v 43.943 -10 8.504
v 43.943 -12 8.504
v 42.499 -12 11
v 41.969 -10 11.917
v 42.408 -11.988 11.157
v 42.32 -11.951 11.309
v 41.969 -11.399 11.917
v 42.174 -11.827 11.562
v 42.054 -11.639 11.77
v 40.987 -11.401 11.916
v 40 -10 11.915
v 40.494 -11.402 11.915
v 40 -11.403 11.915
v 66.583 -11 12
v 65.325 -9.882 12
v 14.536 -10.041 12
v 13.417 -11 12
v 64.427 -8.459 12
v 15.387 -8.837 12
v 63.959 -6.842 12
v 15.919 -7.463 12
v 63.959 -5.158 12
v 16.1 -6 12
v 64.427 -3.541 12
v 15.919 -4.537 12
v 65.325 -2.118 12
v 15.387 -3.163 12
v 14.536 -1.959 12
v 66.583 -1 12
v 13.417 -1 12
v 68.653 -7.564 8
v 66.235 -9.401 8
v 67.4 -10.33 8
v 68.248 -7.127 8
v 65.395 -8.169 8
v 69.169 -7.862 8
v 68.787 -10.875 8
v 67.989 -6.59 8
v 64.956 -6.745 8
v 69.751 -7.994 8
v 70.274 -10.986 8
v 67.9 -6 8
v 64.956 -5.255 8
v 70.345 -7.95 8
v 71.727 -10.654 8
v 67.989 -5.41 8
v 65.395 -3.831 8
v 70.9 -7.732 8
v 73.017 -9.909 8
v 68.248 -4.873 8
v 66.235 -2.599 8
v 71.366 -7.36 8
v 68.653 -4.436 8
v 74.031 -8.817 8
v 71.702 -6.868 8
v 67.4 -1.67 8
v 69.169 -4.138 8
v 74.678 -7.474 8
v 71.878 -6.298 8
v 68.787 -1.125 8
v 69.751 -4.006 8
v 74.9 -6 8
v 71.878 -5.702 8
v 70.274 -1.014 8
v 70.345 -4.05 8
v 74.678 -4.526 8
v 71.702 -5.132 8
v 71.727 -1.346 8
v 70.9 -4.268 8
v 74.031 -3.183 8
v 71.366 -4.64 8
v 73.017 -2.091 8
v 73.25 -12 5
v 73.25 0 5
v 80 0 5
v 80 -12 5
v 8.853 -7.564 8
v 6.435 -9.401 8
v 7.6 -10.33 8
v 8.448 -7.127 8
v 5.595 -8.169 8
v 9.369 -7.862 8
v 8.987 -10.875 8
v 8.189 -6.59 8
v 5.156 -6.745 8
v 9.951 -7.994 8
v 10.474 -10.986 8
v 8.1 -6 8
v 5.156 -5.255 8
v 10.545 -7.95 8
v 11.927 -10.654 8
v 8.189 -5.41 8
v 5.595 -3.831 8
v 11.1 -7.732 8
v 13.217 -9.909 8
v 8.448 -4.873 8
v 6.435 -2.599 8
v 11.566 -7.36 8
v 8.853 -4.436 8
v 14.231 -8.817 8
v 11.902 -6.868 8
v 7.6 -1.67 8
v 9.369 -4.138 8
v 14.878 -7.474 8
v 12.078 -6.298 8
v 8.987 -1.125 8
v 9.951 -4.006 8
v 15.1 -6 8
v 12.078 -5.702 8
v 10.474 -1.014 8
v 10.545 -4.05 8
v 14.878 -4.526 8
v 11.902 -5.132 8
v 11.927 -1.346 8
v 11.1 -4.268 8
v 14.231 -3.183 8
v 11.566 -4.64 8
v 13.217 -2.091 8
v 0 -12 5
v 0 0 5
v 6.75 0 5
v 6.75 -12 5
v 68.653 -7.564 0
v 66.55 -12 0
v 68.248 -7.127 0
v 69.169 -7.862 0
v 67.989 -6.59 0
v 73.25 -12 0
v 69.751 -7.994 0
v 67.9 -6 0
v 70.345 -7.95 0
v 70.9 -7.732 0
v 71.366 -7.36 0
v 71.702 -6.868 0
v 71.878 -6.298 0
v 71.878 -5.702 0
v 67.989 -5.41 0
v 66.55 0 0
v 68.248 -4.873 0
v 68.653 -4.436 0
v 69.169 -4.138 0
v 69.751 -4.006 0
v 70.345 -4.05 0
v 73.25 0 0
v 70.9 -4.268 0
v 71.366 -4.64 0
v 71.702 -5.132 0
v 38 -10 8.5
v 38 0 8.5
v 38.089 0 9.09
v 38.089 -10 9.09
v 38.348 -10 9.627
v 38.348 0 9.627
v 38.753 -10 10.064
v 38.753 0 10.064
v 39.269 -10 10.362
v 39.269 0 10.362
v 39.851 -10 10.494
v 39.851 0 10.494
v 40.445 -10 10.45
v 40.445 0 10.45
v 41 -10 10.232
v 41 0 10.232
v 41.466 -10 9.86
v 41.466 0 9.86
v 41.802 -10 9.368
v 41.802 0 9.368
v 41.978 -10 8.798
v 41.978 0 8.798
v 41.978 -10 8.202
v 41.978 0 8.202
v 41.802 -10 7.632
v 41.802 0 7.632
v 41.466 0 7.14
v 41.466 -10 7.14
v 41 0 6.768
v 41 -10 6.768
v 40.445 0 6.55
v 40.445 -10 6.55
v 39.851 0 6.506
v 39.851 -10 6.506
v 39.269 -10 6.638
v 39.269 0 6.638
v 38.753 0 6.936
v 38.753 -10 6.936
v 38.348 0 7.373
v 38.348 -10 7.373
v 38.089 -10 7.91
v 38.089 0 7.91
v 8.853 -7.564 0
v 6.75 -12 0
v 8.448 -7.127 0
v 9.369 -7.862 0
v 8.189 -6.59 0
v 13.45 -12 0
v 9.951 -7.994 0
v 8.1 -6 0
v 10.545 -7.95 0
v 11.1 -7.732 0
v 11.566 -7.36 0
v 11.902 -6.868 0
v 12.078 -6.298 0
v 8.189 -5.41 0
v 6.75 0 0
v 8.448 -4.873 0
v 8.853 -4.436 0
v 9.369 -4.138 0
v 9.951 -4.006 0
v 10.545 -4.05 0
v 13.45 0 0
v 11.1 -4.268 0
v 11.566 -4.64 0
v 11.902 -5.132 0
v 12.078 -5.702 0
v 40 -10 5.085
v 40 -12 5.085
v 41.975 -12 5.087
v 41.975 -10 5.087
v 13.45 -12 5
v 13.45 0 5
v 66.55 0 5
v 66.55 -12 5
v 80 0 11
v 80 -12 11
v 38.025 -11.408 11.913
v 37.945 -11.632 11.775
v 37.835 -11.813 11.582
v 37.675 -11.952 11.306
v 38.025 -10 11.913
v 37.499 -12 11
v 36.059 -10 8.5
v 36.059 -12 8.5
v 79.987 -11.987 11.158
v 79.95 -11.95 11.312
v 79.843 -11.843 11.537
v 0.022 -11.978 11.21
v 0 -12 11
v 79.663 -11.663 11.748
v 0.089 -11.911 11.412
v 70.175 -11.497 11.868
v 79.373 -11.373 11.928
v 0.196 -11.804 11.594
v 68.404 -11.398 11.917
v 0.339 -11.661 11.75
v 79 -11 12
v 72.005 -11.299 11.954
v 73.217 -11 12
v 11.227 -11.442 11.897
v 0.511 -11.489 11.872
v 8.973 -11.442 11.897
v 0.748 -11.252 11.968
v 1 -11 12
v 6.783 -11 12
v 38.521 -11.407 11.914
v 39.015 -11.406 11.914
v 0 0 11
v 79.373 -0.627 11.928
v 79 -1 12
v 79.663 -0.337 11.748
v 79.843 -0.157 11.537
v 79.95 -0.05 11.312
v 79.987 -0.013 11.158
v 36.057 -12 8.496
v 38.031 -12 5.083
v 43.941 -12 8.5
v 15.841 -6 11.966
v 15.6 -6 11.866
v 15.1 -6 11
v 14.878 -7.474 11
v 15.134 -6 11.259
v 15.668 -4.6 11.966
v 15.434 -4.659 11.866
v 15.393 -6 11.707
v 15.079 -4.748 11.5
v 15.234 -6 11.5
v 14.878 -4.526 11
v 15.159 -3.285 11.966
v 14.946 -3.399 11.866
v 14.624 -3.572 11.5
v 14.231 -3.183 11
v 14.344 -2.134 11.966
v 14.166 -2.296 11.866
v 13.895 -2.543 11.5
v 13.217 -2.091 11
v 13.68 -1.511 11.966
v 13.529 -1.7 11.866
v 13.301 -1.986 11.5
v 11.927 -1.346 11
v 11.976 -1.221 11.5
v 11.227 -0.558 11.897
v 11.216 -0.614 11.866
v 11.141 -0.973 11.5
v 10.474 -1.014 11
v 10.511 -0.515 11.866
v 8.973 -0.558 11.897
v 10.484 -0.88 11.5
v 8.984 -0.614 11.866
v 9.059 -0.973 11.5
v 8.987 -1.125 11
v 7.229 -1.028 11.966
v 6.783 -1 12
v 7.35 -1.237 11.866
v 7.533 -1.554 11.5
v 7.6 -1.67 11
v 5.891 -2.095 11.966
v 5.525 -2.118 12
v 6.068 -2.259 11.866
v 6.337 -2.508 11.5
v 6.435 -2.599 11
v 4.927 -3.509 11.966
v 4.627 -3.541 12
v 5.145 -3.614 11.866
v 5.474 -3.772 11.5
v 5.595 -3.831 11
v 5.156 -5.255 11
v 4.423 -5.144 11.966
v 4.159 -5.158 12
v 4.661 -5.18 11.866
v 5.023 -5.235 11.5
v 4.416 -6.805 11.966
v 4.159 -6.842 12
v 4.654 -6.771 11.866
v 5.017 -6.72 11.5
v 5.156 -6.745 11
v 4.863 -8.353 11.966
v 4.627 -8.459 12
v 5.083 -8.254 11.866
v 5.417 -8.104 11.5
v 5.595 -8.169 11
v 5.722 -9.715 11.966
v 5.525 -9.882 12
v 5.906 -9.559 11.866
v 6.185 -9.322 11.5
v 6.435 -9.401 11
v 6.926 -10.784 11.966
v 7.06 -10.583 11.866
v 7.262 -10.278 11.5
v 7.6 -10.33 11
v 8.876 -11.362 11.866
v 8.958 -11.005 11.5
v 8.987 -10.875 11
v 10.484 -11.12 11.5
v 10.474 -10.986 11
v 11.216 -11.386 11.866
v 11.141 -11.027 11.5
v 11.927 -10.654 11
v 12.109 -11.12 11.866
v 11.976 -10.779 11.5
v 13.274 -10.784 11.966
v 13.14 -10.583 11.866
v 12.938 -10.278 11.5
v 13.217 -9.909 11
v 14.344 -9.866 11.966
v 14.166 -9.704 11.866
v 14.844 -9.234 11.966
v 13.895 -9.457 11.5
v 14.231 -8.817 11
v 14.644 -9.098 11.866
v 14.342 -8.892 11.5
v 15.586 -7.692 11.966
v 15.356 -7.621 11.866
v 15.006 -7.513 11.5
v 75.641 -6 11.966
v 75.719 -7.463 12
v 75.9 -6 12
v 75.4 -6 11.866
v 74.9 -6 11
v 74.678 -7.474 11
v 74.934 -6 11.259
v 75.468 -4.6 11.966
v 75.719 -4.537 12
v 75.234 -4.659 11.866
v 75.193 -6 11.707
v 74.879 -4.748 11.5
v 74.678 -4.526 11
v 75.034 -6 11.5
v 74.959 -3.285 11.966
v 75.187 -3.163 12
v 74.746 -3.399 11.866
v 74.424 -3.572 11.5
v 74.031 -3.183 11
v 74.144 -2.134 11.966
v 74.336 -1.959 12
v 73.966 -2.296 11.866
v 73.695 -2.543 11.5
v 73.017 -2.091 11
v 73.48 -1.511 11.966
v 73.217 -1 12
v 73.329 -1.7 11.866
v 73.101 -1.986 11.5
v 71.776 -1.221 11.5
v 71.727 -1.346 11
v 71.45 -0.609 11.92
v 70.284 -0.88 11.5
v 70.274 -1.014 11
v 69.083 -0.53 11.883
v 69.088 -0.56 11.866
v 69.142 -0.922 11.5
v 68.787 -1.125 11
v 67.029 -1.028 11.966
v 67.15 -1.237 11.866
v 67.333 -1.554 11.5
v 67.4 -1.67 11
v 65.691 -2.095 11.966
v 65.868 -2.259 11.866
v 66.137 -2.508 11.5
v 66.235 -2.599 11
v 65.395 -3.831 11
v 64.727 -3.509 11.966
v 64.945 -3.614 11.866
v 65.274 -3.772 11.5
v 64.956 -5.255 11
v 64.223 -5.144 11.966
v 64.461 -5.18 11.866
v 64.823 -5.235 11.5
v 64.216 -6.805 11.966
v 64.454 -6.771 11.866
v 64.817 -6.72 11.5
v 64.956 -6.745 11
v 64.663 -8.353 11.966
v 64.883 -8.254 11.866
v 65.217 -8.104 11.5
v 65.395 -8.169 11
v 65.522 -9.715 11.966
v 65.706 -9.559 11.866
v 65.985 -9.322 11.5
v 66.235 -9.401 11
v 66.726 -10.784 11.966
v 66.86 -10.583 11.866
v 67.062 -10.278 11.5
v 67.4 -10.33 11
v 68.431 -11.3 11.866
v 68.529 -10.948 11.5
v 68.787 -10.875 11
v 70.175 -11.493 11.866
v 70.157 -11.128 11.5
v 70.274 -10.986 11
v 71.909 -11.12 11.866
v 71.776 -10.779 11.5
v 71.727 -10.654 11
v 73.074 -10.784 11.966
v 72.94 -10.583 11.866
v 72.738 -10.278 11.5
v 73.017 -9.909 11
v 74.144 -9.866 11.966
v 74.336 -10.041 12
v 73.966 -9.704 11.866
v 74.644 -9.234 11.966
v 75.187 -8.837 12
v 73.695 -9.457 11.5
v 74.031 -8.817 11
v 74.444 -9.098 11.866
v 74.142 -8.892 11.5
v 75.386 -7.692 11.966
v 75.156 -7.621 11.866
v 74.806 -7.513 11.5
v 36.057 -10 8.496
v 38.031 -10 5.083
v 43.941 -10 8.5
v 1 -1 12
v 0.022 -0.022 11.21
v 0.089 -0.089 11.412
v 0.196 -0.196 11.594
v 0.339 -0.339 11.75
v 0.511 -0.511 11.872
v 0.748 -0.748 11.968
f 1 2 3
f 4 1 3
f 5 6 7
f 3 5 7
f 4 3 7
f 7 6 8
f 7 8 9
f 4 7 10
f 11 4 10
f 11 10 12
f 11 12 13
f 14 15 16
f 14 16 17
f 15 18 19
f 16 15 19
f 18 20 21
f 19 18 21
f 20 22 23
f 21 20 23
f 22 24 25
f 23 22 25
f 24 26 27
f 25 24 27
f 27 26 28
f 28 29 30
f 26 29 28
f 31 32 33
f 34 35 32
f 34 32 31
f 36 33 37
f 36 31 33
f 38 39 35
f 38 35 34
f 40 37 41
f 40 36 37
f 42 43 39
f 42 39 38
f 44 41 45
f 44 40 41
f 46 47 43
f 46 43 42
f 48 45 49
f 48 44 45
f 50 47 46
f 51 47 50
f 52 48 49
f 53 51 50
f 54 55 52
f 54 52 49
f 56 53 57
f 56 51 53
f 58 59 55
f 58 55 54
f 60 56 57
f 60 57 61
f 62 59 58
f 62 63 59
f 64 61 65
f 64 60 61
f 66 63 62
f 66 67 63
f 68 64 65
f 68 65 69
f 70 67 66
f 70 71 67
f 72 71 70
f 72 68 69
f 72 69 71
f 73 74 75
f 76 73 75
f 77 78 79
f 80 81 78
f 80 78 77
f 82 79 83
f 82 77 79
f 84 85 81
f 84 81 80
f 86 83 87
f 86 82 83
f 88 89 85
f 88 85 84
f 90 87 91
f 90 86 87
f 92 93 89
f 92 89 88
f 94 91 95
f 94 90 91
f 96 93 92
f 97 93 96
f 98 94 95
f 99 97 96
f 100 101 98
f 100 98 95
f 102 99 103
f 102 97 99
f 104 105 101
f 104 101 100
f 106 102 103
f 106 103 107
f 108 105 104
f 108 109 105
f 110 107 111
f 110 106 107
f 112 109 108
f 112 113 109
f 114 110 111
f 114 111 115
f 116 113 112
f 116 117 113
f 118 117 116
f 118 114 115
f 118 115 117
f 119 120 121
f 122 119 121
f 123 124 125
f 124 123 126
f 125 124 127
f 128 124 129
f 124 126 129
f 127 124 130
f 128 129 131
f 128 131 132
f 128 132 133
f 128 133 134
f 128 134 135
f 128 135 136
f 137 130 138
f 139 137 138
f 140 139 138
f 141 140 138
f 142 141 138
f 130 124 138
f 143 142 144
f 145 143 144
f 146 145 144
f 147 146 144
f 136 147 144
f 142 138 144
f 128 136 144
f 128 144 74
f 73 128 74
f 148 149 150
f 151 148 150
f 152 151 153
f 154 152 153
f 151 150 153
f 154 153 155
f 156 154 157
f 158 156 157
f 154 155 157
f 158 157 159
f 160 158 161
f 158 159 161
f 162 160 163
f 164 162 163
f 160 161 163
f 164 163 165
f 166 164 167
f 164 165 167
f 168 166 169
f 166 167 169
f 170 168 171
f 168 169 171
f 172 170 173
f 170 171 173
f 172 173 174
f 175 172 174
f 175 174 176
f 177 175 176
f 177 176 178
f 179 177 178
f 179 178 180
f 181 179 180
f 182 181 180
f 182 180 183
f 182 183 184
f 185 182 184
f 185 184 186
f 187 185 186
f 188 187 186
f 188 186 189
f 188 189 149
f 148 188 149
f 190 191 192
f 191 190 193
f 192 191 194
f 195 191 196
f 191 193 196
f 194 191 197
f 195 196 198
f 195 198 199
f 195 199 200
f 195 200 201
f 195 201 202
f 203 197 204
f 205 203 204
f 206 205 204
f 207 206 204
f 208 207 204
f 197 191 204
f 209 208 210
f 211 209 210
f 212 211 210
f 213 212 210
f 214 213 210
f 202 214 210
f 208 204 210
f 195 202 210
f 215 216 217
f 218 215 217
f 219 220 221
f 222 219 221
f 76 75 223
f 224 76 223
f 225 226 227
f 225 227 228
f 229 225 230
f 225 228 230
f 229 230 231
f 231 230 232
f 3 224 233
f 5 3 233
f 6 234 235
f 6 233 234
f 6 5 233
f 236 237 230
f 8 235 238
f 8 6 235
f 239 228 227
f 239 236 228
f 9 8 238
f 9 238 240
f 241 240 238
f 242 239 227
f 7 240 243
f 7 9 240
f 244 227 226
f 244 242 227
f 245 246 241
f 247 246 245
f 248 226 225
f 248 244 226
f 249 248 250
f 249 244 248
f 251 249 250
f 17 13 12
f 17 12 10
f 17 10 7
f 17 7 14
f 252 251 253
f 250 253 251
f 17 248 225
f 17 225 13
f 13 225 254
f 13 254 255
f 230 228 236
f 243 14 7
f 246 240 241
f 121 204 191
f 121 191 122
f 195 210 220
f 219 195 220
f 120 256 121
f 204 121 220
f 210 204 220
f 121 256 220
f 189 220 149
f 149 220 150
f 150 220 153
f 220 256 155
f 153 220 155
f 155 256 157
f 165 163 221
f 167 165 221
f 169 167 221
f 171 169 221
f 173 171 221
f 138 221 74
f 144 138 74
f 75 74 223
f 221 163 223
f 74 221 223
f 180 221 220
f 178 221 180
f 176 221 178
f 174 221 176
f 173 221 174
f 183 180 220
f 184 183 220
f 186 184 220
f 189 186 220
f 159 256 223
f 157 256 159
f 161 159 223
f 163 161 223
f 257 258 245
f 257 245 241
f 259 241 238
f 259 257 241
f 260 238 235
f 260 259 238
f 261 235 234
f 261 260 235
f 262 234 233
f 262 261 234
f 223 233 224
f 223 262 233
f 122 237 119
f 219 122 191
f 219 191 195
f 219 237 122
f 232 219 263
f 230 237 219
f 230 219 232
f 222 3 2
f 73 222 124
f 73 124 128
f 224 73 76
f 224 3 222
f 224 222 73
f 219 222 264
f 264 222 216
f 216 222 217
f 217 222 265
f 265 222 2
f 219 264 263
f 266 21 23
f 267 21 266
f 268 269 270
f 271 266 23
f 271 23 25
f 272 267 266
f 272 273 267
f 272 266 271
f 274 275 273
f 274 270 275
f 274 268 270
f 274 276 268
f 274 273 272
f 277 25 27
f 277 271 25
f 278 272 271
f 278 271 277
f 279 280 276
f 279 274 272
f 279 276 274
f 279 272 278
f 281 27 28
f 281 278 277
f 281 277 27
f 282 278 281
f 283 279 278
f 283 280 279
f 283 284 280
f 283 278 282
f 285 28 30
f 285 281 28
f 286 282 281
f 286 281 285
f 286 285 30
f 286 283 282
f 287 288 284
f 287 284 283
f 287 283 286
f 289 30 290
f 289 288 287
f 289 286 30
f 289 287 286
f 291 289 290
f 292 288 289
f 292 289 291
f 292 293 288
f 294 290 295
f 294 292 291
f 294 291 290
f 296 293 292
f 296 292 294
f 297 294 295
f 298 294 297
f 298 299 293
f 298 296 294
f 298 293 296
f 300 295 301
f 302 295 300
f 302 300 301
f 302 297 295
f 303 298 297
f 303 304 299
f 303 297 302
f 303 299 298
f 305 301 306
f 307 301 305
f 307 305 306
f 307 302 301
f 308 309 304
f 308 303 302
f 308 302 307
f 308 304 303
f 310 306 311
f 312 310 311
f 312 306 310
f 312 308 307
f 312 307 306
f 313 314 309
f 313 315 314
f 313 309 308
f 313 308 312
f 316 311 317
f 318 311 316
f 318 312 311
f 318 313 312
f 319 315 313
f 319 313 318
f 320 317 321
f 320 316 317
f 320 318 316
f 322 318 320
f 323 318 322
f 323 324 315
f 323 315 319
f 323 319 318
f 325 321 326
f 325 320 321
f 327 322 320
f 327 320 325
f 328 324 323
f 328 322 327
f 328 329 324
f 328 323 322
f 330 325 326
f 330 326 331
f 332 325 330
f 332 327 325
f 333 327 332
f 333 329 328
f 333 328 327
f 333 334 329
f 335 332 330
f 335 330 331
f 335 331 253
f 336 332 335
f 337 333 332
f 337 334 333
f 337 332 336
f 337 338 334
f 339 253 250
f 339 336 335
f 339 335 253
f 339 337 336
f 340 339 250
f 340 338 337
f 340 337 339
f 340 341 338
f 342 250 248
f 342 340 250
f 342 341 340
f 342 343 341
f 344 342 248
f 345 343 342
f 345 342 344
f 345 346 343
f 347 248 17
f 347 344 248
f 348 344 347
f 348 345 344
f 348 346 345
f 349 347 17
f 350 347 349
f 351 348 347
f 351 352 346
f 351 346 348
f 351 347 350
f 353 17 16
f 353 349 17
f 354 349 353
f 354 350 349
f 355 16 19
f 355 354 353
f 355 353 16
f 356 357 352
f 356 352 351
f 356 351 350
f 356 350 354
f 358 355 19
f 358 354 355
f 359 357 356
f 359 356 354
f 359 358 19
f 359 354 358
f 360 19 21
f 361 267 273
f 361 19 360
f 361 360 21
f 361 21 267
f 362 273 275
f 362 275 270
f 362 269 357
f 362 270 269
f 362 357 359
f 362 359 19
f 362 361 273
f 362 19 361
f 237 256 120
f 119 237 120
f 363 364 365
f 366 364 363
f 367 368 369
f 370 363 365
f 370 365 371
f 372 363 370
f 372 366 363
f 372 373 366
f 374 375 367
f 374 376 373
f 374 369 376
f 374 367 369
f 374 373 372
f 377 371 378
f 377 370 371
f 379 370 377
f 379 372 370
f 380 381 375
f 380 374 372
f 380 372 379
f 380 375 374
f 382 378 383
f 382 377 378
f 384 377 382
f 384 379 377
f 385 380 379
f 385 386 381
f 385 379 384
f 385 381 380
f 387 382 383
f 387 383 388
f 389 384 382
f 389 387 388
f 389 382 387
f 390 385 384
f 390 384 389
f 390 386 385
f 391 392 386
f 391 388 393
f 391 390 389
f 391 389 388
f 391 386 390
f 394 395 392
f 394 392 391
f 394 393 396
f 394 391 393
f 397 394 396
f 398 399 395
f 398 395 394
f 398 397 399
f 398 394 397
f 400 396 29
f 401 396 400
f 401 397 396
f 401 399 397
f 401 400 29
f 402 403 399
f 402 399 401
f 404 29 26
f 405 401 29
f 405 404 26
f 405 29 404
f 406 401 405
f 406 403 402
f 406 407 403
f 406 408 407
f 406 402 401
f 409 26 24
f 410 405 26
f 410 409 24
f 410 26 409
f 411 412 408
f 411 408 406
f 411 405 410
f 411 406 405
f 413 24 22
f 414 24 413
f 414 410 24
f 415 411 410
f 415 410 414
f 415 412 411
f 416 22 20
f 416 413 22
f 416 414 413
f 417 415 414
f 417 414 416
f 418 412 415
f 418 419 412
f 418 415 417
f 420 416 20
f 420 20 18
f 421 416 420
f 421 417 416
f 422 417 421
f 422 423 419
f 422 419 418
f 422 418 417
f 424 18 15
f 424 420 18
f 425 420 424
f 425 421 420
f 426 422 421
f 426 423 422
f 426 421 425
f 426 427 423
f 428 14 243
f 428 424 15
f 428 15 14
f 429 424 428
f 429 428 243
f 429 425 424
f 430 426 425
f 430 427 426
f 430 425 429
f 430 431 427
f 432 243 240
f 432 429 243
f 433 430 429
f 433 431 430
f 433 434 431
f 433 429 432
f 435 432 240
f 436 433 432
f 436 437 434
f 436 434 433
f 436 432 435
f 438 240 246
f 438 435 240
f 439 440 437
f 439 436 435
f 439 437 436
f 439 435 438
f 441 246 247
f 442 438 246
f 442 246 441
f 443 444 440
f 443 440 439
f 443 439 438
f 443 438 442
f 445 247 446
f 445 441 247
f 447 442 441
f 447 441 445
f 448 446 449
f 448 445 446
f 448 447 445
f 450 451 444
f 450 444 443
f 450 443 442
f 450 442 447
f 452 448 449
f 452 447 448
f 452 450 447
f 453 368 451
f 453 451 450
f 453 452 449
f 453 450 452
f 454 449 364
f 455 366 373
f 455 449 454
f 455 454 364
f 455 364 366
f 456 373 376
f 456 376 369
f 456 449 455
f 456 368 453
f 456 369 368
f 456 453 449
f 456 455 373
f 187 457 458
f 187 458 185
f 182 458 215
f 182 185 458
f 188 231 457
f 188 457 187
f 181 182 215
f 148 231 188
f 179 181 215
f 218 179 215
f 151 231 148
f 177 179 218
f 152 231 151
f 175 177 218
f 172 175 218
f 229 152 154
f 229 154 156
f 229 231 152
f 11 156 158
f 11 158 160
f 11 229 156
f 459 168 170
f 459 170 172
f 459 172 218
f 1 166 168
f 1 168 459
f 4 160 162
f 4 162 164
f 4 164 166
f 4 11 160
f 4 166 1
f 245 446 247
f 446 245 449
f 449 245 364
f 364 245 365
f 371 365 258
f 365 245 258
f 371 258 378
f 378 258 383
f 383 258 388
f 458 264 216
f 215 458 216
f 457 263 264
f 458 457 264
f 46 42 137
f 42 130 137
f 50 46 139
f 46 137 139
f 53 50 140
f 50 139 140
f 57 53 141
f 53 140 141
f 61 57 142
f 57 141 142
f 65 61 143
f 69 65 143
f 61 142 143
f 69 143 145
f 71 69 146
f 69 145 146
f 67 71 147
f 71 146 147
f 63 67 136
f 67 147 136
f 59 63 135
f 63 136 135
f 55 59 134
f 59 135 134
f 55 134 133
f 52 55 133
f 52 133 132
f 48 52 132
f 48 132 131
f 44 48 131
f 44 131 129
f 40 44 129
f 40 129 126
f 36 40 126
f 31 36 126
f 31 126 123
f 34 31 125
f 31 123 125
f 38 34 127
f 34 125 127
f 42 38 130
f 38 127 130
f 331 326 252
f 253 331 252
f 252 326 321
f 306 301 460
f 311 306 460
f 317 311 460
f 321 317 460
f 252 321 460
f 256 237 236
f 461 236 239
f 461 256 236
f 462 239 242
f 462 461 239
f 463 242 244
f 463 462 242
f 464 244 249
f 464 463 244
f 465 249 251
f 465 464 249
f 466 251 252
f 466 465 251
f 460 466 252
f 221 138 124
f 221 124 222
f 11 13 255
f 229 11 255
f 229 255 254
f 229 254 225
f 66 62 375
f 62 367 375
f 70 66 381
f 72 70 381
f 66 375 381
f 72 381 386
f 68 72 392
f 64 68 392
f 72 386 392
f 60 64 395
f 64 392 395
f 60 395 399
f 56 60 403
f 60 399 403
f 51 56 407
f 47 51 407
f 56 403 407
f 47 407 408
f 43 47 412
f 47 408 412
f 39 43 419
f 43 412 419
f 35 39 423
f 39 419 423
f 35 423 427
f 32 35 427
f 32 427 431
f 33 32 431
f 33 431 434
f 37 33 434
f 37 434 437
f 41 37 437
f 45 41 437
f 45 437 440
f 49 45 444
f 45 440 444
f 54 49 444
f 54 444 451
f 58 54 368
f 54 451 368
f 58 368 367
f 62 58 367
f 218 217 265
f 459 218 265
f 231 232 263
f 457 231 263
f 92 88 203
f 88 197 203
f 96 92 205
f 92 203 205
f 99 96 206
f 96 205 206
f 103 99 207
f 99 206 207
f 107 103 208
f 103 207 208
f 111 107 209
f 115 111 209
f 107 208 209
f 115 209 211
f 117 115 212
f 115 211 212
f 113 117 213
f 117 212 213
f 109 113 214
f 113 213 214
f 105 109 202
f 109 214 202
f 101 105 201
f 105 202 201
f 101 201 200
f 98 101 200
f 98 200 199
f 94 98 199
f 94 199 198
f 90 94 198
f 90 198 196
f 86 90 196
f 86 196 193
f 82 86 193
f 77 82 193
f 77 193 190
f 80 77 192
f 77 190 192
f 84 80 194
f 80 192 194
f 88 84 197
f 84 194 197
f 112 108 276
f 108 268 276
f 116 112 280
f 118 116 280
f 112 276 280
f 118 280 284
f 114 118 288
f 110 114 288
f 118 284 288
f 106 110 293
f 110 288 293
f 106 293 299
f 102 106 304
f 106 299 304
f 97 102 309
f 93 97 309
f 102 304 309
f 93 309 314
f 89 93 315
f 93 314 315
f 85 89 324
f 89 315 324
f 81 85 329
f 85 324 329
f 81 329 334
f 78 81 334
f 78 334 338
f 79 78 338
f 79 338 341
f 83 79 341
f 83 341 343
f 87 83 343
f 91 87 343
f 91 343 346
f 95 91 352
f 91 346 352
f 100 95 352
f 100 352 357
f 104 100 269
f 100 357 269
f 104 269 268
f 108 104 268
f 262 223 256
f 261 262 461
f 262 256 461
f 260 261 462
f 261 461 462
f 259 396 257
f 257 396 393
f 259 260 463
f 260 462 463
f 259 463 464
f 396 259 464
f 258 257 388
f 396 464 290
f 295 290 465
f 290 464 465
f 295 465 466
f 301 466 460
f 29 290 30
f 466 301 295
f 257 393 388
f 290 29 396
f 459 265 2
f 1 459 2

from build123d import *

# Parameters (mm, degrees)
F0_W           = 3.35
F0_H           = 5
F1_DEPTH       = 12
F3_D           = 4
F3_DEPTH       = 25
F3_CBORE_D     = 10
F3_CBORE_DEPTH = 4
F3_TIP         = 1.2017212381
F5_D           = 4
F5_DEPTH       = 25
F5_TIP         = 1.2017212381
F6_DEPTH       = 2
F7_T1_DEPTH    = 17
F7_T3_DEPTH    = 85


# Not quite as in the source:
# - a fillet or chamfer that OpenCascade refuses, or shapes differently, is made with other operations: its cross-section is extruded or revolved along the edge and cut away or added


with BuildPart() as f1:
    # F0 (on Front) → F1 (new body)
    with BuildSketch(Plane.XZ):
        with Locations((8.425, 2.5)):
            Rectangle(F0_W, F0_H)
        with Locations((11.775, 2.5)):
            Rectangle(F0_W, F0_H)
        Polygon((0, 5), (6.75, 5), (10.1, 5), (10.1, 12), (0, 12), align=None)
        Polygon((10.1, 12), (10.1, 5), (13.45, 5), (66.55, 5), (69.9, 5), (69.9, 12), align=None)
        with Locations((68.225, 2.5)):
            Rectangle(F0_W, F0_H)
        Polygon((80, 12), (69.9, 12), (69.9, 5), (73.25, 5), (80, 5), align=None)
        with Locations((71.575, 2.5)):
            Rectangle(F0_W, F0_H)
    extrude(amount=F1_DEPTH)

    # F3
    with Locations(Plane.XY.offset(12)):
        with Locations((10.1, -6), (69.9, -6)):
            CounterBoreHole(F3_D / 2, F3_CBORE_D / 2, F3_CBORE_DEPTH, depth=F3_DEPTH)
            with Locations((0, 0, -(F3_DEPTH + F3_TIP / 2))):  # 118° drill point
                Cone(0, F3_D / 2, F3_TIP, mode=Mode.SUBTRACT)

    # F5
    with Locations(Plane.XZ.offset(12)):
        with Locations((40, 8.5)):
            Hole(F5_D / 2, depth=F5_DEPTH)
            with Locations((0, 0, -(F5_DEPTH + F5_TIP / 2))):  # 118° drill point
                Cone(0, F5_D / 2, F5_TIP, mode=Mode.SUBTRACT)

    # F4 (on face) → F6 (cut)
    with BuildSketch(Plane.XZ.offset(12)):
        with BuildLine():
            Line((38.0252040749, 11.9131824428), (36.0587919372, 8.5))
            Line((36.0587919372, 8.5), (38.5835167795, 8.5))
            ThreePointArc((38.5835167795, 8.5), (38.9983951094, 9.5016048906), (40, 9.9164832205))
            Line((40, 9.9164832205), (40, 11.9150014487))
            Line((40, 11.9150014487), (38.0252040749, 11.9131824428))
        make_face()
        with BuildLine():
            Line((38.5835167795, 8.5), (36.0587919372, 8.5))
            Line((36.0587919372, 8.5), (36.0566993343, 8.496367783))
            Line((36.0566993343, 8.496367783), (38.0314952594, 5.0831853402))
            Line((38.0314952594, 5.0831853402), (40, 5.0849985513))
            Line((40, 5.0849985513), (40, 7.0835167795))
            ThreePointArc((40, 7.0835167795), (38.9983951094, 7.4983951094), (38.5835167795, 8.5))
        make_face()
        with BuildLine():
            Line((40, 11.9150014487), (40, 9.9164832205))
            ThreePointArc((40, 9.9164832205), (41.0016048906, 9.5016048906), (41.4164832205, 8.5))
            Line((41.4164832205, 8.5), (43.9412080628, 8.5))
            Line((43.9412080628, 8.5), (43.9433006657, 8.503632217))
            Line((43.9433006657, 8.503632217), (41.9685047406, 11.9168146598))
            Line((41.9685047406, 11.9168146598), (40, 11.9150014487))
        make_face()
        with BuildLine():
            ThreePointArc((41.4164832205, 8.5), (41.0016048906, 7.4983951094), (40, 7.0835167795))
            Line((40, 7.0835167795), (40, 5.0849985513))
            Line((40, 5.0849985513), (41.9747959251, 5.0868175572))
            Line((41.9747959251, 5.0868175572), (43.9412080628, 8.5))
            Line((43.9412080628, 8.5), (41.4164832205, 8.5))
        make_face()
    extrude(amount=-F6_DEPTH, mode=Mode.SUBTRACT)

    # F7: fillet of radius 1 on 6 edges, made by hand

    # F7_s2 → F7_t1 (cut)
    with BuildSketch(Plane.XZ.offset(-2.5)):
        with BuildLine():
            ThreePointArc((79, 12), (79.7071067812, 11.7071067812), (80, 11))
            Line((80, 11), (80, 12))
            Line((80, 12), (79, 12))
        make_face()
        with BuildLine():
            ThreePointArc((0, 11), (0.2928932188, 11.7071067812), (1, 12))
            Line((1, 12), (0, 12))
            Line((0, 12), (0, 11))
        make_face()
    extrude(amount=F7_T1_DEPTH, mode=Mode.SUBTRACT)

    # F7_s4 → F7_t3 (cut)
    with BuildSketch(Plane.YZ.offset(-2.5)):
        with BuildLine():
            ThreePointArc((0, 11), (-0.2928932188, 11.7071067812), (-1, 12))
            Line((-1, 12), (0, 12))
            Line((0, 12), (0, 11))
        make_face()
        with BuildLine():
            ThreePointArc((-12, 11), (-11.7071067812, 11.7071067812), (-11, 12))
            Line((-11, 12), (-12, 12))
            Line((-12, 12), (-12, 11))
        make_face()
    extrude(amount=F7_T3_DEPTH, mode=Mode.SUBTRACT)

    # F7_s5 → F7_t6 (revolve, cut)
    with BuildSketch(Plane.XZ.offset(6)):
        with BuildLine():
            ThreePointArc((75.9, 12), (75.1928932188, 11.7071067812), (74.9, 11))
            Line((74.9, 11), (74.9, 12))
            Line((74.9, 12), (75.9, 12))
        make_face()
    revolve(axis=Axis((69.9, -6, 12), (0, 0, 1)), mode=Mode.SUBTRACT)

    # F7_s7 → F7_t8 (revolve, cut)
    with BuildSketch(Plane.XZ.offset(6)):
        with BuildLine():
            ThreePointArc((16.1, 12), (15.3928932188, 11.7071067812), (15.1, 11))
            Line((15.1, 11), (15.1, 12))
            Line((15.1, 12), (16.1, 12))
        make_face()
    revolve(axis=Axis((10.1, -6, 12), (0, 0, 1)), mode=Mode.SUBTRACT)


solid = f1.part
